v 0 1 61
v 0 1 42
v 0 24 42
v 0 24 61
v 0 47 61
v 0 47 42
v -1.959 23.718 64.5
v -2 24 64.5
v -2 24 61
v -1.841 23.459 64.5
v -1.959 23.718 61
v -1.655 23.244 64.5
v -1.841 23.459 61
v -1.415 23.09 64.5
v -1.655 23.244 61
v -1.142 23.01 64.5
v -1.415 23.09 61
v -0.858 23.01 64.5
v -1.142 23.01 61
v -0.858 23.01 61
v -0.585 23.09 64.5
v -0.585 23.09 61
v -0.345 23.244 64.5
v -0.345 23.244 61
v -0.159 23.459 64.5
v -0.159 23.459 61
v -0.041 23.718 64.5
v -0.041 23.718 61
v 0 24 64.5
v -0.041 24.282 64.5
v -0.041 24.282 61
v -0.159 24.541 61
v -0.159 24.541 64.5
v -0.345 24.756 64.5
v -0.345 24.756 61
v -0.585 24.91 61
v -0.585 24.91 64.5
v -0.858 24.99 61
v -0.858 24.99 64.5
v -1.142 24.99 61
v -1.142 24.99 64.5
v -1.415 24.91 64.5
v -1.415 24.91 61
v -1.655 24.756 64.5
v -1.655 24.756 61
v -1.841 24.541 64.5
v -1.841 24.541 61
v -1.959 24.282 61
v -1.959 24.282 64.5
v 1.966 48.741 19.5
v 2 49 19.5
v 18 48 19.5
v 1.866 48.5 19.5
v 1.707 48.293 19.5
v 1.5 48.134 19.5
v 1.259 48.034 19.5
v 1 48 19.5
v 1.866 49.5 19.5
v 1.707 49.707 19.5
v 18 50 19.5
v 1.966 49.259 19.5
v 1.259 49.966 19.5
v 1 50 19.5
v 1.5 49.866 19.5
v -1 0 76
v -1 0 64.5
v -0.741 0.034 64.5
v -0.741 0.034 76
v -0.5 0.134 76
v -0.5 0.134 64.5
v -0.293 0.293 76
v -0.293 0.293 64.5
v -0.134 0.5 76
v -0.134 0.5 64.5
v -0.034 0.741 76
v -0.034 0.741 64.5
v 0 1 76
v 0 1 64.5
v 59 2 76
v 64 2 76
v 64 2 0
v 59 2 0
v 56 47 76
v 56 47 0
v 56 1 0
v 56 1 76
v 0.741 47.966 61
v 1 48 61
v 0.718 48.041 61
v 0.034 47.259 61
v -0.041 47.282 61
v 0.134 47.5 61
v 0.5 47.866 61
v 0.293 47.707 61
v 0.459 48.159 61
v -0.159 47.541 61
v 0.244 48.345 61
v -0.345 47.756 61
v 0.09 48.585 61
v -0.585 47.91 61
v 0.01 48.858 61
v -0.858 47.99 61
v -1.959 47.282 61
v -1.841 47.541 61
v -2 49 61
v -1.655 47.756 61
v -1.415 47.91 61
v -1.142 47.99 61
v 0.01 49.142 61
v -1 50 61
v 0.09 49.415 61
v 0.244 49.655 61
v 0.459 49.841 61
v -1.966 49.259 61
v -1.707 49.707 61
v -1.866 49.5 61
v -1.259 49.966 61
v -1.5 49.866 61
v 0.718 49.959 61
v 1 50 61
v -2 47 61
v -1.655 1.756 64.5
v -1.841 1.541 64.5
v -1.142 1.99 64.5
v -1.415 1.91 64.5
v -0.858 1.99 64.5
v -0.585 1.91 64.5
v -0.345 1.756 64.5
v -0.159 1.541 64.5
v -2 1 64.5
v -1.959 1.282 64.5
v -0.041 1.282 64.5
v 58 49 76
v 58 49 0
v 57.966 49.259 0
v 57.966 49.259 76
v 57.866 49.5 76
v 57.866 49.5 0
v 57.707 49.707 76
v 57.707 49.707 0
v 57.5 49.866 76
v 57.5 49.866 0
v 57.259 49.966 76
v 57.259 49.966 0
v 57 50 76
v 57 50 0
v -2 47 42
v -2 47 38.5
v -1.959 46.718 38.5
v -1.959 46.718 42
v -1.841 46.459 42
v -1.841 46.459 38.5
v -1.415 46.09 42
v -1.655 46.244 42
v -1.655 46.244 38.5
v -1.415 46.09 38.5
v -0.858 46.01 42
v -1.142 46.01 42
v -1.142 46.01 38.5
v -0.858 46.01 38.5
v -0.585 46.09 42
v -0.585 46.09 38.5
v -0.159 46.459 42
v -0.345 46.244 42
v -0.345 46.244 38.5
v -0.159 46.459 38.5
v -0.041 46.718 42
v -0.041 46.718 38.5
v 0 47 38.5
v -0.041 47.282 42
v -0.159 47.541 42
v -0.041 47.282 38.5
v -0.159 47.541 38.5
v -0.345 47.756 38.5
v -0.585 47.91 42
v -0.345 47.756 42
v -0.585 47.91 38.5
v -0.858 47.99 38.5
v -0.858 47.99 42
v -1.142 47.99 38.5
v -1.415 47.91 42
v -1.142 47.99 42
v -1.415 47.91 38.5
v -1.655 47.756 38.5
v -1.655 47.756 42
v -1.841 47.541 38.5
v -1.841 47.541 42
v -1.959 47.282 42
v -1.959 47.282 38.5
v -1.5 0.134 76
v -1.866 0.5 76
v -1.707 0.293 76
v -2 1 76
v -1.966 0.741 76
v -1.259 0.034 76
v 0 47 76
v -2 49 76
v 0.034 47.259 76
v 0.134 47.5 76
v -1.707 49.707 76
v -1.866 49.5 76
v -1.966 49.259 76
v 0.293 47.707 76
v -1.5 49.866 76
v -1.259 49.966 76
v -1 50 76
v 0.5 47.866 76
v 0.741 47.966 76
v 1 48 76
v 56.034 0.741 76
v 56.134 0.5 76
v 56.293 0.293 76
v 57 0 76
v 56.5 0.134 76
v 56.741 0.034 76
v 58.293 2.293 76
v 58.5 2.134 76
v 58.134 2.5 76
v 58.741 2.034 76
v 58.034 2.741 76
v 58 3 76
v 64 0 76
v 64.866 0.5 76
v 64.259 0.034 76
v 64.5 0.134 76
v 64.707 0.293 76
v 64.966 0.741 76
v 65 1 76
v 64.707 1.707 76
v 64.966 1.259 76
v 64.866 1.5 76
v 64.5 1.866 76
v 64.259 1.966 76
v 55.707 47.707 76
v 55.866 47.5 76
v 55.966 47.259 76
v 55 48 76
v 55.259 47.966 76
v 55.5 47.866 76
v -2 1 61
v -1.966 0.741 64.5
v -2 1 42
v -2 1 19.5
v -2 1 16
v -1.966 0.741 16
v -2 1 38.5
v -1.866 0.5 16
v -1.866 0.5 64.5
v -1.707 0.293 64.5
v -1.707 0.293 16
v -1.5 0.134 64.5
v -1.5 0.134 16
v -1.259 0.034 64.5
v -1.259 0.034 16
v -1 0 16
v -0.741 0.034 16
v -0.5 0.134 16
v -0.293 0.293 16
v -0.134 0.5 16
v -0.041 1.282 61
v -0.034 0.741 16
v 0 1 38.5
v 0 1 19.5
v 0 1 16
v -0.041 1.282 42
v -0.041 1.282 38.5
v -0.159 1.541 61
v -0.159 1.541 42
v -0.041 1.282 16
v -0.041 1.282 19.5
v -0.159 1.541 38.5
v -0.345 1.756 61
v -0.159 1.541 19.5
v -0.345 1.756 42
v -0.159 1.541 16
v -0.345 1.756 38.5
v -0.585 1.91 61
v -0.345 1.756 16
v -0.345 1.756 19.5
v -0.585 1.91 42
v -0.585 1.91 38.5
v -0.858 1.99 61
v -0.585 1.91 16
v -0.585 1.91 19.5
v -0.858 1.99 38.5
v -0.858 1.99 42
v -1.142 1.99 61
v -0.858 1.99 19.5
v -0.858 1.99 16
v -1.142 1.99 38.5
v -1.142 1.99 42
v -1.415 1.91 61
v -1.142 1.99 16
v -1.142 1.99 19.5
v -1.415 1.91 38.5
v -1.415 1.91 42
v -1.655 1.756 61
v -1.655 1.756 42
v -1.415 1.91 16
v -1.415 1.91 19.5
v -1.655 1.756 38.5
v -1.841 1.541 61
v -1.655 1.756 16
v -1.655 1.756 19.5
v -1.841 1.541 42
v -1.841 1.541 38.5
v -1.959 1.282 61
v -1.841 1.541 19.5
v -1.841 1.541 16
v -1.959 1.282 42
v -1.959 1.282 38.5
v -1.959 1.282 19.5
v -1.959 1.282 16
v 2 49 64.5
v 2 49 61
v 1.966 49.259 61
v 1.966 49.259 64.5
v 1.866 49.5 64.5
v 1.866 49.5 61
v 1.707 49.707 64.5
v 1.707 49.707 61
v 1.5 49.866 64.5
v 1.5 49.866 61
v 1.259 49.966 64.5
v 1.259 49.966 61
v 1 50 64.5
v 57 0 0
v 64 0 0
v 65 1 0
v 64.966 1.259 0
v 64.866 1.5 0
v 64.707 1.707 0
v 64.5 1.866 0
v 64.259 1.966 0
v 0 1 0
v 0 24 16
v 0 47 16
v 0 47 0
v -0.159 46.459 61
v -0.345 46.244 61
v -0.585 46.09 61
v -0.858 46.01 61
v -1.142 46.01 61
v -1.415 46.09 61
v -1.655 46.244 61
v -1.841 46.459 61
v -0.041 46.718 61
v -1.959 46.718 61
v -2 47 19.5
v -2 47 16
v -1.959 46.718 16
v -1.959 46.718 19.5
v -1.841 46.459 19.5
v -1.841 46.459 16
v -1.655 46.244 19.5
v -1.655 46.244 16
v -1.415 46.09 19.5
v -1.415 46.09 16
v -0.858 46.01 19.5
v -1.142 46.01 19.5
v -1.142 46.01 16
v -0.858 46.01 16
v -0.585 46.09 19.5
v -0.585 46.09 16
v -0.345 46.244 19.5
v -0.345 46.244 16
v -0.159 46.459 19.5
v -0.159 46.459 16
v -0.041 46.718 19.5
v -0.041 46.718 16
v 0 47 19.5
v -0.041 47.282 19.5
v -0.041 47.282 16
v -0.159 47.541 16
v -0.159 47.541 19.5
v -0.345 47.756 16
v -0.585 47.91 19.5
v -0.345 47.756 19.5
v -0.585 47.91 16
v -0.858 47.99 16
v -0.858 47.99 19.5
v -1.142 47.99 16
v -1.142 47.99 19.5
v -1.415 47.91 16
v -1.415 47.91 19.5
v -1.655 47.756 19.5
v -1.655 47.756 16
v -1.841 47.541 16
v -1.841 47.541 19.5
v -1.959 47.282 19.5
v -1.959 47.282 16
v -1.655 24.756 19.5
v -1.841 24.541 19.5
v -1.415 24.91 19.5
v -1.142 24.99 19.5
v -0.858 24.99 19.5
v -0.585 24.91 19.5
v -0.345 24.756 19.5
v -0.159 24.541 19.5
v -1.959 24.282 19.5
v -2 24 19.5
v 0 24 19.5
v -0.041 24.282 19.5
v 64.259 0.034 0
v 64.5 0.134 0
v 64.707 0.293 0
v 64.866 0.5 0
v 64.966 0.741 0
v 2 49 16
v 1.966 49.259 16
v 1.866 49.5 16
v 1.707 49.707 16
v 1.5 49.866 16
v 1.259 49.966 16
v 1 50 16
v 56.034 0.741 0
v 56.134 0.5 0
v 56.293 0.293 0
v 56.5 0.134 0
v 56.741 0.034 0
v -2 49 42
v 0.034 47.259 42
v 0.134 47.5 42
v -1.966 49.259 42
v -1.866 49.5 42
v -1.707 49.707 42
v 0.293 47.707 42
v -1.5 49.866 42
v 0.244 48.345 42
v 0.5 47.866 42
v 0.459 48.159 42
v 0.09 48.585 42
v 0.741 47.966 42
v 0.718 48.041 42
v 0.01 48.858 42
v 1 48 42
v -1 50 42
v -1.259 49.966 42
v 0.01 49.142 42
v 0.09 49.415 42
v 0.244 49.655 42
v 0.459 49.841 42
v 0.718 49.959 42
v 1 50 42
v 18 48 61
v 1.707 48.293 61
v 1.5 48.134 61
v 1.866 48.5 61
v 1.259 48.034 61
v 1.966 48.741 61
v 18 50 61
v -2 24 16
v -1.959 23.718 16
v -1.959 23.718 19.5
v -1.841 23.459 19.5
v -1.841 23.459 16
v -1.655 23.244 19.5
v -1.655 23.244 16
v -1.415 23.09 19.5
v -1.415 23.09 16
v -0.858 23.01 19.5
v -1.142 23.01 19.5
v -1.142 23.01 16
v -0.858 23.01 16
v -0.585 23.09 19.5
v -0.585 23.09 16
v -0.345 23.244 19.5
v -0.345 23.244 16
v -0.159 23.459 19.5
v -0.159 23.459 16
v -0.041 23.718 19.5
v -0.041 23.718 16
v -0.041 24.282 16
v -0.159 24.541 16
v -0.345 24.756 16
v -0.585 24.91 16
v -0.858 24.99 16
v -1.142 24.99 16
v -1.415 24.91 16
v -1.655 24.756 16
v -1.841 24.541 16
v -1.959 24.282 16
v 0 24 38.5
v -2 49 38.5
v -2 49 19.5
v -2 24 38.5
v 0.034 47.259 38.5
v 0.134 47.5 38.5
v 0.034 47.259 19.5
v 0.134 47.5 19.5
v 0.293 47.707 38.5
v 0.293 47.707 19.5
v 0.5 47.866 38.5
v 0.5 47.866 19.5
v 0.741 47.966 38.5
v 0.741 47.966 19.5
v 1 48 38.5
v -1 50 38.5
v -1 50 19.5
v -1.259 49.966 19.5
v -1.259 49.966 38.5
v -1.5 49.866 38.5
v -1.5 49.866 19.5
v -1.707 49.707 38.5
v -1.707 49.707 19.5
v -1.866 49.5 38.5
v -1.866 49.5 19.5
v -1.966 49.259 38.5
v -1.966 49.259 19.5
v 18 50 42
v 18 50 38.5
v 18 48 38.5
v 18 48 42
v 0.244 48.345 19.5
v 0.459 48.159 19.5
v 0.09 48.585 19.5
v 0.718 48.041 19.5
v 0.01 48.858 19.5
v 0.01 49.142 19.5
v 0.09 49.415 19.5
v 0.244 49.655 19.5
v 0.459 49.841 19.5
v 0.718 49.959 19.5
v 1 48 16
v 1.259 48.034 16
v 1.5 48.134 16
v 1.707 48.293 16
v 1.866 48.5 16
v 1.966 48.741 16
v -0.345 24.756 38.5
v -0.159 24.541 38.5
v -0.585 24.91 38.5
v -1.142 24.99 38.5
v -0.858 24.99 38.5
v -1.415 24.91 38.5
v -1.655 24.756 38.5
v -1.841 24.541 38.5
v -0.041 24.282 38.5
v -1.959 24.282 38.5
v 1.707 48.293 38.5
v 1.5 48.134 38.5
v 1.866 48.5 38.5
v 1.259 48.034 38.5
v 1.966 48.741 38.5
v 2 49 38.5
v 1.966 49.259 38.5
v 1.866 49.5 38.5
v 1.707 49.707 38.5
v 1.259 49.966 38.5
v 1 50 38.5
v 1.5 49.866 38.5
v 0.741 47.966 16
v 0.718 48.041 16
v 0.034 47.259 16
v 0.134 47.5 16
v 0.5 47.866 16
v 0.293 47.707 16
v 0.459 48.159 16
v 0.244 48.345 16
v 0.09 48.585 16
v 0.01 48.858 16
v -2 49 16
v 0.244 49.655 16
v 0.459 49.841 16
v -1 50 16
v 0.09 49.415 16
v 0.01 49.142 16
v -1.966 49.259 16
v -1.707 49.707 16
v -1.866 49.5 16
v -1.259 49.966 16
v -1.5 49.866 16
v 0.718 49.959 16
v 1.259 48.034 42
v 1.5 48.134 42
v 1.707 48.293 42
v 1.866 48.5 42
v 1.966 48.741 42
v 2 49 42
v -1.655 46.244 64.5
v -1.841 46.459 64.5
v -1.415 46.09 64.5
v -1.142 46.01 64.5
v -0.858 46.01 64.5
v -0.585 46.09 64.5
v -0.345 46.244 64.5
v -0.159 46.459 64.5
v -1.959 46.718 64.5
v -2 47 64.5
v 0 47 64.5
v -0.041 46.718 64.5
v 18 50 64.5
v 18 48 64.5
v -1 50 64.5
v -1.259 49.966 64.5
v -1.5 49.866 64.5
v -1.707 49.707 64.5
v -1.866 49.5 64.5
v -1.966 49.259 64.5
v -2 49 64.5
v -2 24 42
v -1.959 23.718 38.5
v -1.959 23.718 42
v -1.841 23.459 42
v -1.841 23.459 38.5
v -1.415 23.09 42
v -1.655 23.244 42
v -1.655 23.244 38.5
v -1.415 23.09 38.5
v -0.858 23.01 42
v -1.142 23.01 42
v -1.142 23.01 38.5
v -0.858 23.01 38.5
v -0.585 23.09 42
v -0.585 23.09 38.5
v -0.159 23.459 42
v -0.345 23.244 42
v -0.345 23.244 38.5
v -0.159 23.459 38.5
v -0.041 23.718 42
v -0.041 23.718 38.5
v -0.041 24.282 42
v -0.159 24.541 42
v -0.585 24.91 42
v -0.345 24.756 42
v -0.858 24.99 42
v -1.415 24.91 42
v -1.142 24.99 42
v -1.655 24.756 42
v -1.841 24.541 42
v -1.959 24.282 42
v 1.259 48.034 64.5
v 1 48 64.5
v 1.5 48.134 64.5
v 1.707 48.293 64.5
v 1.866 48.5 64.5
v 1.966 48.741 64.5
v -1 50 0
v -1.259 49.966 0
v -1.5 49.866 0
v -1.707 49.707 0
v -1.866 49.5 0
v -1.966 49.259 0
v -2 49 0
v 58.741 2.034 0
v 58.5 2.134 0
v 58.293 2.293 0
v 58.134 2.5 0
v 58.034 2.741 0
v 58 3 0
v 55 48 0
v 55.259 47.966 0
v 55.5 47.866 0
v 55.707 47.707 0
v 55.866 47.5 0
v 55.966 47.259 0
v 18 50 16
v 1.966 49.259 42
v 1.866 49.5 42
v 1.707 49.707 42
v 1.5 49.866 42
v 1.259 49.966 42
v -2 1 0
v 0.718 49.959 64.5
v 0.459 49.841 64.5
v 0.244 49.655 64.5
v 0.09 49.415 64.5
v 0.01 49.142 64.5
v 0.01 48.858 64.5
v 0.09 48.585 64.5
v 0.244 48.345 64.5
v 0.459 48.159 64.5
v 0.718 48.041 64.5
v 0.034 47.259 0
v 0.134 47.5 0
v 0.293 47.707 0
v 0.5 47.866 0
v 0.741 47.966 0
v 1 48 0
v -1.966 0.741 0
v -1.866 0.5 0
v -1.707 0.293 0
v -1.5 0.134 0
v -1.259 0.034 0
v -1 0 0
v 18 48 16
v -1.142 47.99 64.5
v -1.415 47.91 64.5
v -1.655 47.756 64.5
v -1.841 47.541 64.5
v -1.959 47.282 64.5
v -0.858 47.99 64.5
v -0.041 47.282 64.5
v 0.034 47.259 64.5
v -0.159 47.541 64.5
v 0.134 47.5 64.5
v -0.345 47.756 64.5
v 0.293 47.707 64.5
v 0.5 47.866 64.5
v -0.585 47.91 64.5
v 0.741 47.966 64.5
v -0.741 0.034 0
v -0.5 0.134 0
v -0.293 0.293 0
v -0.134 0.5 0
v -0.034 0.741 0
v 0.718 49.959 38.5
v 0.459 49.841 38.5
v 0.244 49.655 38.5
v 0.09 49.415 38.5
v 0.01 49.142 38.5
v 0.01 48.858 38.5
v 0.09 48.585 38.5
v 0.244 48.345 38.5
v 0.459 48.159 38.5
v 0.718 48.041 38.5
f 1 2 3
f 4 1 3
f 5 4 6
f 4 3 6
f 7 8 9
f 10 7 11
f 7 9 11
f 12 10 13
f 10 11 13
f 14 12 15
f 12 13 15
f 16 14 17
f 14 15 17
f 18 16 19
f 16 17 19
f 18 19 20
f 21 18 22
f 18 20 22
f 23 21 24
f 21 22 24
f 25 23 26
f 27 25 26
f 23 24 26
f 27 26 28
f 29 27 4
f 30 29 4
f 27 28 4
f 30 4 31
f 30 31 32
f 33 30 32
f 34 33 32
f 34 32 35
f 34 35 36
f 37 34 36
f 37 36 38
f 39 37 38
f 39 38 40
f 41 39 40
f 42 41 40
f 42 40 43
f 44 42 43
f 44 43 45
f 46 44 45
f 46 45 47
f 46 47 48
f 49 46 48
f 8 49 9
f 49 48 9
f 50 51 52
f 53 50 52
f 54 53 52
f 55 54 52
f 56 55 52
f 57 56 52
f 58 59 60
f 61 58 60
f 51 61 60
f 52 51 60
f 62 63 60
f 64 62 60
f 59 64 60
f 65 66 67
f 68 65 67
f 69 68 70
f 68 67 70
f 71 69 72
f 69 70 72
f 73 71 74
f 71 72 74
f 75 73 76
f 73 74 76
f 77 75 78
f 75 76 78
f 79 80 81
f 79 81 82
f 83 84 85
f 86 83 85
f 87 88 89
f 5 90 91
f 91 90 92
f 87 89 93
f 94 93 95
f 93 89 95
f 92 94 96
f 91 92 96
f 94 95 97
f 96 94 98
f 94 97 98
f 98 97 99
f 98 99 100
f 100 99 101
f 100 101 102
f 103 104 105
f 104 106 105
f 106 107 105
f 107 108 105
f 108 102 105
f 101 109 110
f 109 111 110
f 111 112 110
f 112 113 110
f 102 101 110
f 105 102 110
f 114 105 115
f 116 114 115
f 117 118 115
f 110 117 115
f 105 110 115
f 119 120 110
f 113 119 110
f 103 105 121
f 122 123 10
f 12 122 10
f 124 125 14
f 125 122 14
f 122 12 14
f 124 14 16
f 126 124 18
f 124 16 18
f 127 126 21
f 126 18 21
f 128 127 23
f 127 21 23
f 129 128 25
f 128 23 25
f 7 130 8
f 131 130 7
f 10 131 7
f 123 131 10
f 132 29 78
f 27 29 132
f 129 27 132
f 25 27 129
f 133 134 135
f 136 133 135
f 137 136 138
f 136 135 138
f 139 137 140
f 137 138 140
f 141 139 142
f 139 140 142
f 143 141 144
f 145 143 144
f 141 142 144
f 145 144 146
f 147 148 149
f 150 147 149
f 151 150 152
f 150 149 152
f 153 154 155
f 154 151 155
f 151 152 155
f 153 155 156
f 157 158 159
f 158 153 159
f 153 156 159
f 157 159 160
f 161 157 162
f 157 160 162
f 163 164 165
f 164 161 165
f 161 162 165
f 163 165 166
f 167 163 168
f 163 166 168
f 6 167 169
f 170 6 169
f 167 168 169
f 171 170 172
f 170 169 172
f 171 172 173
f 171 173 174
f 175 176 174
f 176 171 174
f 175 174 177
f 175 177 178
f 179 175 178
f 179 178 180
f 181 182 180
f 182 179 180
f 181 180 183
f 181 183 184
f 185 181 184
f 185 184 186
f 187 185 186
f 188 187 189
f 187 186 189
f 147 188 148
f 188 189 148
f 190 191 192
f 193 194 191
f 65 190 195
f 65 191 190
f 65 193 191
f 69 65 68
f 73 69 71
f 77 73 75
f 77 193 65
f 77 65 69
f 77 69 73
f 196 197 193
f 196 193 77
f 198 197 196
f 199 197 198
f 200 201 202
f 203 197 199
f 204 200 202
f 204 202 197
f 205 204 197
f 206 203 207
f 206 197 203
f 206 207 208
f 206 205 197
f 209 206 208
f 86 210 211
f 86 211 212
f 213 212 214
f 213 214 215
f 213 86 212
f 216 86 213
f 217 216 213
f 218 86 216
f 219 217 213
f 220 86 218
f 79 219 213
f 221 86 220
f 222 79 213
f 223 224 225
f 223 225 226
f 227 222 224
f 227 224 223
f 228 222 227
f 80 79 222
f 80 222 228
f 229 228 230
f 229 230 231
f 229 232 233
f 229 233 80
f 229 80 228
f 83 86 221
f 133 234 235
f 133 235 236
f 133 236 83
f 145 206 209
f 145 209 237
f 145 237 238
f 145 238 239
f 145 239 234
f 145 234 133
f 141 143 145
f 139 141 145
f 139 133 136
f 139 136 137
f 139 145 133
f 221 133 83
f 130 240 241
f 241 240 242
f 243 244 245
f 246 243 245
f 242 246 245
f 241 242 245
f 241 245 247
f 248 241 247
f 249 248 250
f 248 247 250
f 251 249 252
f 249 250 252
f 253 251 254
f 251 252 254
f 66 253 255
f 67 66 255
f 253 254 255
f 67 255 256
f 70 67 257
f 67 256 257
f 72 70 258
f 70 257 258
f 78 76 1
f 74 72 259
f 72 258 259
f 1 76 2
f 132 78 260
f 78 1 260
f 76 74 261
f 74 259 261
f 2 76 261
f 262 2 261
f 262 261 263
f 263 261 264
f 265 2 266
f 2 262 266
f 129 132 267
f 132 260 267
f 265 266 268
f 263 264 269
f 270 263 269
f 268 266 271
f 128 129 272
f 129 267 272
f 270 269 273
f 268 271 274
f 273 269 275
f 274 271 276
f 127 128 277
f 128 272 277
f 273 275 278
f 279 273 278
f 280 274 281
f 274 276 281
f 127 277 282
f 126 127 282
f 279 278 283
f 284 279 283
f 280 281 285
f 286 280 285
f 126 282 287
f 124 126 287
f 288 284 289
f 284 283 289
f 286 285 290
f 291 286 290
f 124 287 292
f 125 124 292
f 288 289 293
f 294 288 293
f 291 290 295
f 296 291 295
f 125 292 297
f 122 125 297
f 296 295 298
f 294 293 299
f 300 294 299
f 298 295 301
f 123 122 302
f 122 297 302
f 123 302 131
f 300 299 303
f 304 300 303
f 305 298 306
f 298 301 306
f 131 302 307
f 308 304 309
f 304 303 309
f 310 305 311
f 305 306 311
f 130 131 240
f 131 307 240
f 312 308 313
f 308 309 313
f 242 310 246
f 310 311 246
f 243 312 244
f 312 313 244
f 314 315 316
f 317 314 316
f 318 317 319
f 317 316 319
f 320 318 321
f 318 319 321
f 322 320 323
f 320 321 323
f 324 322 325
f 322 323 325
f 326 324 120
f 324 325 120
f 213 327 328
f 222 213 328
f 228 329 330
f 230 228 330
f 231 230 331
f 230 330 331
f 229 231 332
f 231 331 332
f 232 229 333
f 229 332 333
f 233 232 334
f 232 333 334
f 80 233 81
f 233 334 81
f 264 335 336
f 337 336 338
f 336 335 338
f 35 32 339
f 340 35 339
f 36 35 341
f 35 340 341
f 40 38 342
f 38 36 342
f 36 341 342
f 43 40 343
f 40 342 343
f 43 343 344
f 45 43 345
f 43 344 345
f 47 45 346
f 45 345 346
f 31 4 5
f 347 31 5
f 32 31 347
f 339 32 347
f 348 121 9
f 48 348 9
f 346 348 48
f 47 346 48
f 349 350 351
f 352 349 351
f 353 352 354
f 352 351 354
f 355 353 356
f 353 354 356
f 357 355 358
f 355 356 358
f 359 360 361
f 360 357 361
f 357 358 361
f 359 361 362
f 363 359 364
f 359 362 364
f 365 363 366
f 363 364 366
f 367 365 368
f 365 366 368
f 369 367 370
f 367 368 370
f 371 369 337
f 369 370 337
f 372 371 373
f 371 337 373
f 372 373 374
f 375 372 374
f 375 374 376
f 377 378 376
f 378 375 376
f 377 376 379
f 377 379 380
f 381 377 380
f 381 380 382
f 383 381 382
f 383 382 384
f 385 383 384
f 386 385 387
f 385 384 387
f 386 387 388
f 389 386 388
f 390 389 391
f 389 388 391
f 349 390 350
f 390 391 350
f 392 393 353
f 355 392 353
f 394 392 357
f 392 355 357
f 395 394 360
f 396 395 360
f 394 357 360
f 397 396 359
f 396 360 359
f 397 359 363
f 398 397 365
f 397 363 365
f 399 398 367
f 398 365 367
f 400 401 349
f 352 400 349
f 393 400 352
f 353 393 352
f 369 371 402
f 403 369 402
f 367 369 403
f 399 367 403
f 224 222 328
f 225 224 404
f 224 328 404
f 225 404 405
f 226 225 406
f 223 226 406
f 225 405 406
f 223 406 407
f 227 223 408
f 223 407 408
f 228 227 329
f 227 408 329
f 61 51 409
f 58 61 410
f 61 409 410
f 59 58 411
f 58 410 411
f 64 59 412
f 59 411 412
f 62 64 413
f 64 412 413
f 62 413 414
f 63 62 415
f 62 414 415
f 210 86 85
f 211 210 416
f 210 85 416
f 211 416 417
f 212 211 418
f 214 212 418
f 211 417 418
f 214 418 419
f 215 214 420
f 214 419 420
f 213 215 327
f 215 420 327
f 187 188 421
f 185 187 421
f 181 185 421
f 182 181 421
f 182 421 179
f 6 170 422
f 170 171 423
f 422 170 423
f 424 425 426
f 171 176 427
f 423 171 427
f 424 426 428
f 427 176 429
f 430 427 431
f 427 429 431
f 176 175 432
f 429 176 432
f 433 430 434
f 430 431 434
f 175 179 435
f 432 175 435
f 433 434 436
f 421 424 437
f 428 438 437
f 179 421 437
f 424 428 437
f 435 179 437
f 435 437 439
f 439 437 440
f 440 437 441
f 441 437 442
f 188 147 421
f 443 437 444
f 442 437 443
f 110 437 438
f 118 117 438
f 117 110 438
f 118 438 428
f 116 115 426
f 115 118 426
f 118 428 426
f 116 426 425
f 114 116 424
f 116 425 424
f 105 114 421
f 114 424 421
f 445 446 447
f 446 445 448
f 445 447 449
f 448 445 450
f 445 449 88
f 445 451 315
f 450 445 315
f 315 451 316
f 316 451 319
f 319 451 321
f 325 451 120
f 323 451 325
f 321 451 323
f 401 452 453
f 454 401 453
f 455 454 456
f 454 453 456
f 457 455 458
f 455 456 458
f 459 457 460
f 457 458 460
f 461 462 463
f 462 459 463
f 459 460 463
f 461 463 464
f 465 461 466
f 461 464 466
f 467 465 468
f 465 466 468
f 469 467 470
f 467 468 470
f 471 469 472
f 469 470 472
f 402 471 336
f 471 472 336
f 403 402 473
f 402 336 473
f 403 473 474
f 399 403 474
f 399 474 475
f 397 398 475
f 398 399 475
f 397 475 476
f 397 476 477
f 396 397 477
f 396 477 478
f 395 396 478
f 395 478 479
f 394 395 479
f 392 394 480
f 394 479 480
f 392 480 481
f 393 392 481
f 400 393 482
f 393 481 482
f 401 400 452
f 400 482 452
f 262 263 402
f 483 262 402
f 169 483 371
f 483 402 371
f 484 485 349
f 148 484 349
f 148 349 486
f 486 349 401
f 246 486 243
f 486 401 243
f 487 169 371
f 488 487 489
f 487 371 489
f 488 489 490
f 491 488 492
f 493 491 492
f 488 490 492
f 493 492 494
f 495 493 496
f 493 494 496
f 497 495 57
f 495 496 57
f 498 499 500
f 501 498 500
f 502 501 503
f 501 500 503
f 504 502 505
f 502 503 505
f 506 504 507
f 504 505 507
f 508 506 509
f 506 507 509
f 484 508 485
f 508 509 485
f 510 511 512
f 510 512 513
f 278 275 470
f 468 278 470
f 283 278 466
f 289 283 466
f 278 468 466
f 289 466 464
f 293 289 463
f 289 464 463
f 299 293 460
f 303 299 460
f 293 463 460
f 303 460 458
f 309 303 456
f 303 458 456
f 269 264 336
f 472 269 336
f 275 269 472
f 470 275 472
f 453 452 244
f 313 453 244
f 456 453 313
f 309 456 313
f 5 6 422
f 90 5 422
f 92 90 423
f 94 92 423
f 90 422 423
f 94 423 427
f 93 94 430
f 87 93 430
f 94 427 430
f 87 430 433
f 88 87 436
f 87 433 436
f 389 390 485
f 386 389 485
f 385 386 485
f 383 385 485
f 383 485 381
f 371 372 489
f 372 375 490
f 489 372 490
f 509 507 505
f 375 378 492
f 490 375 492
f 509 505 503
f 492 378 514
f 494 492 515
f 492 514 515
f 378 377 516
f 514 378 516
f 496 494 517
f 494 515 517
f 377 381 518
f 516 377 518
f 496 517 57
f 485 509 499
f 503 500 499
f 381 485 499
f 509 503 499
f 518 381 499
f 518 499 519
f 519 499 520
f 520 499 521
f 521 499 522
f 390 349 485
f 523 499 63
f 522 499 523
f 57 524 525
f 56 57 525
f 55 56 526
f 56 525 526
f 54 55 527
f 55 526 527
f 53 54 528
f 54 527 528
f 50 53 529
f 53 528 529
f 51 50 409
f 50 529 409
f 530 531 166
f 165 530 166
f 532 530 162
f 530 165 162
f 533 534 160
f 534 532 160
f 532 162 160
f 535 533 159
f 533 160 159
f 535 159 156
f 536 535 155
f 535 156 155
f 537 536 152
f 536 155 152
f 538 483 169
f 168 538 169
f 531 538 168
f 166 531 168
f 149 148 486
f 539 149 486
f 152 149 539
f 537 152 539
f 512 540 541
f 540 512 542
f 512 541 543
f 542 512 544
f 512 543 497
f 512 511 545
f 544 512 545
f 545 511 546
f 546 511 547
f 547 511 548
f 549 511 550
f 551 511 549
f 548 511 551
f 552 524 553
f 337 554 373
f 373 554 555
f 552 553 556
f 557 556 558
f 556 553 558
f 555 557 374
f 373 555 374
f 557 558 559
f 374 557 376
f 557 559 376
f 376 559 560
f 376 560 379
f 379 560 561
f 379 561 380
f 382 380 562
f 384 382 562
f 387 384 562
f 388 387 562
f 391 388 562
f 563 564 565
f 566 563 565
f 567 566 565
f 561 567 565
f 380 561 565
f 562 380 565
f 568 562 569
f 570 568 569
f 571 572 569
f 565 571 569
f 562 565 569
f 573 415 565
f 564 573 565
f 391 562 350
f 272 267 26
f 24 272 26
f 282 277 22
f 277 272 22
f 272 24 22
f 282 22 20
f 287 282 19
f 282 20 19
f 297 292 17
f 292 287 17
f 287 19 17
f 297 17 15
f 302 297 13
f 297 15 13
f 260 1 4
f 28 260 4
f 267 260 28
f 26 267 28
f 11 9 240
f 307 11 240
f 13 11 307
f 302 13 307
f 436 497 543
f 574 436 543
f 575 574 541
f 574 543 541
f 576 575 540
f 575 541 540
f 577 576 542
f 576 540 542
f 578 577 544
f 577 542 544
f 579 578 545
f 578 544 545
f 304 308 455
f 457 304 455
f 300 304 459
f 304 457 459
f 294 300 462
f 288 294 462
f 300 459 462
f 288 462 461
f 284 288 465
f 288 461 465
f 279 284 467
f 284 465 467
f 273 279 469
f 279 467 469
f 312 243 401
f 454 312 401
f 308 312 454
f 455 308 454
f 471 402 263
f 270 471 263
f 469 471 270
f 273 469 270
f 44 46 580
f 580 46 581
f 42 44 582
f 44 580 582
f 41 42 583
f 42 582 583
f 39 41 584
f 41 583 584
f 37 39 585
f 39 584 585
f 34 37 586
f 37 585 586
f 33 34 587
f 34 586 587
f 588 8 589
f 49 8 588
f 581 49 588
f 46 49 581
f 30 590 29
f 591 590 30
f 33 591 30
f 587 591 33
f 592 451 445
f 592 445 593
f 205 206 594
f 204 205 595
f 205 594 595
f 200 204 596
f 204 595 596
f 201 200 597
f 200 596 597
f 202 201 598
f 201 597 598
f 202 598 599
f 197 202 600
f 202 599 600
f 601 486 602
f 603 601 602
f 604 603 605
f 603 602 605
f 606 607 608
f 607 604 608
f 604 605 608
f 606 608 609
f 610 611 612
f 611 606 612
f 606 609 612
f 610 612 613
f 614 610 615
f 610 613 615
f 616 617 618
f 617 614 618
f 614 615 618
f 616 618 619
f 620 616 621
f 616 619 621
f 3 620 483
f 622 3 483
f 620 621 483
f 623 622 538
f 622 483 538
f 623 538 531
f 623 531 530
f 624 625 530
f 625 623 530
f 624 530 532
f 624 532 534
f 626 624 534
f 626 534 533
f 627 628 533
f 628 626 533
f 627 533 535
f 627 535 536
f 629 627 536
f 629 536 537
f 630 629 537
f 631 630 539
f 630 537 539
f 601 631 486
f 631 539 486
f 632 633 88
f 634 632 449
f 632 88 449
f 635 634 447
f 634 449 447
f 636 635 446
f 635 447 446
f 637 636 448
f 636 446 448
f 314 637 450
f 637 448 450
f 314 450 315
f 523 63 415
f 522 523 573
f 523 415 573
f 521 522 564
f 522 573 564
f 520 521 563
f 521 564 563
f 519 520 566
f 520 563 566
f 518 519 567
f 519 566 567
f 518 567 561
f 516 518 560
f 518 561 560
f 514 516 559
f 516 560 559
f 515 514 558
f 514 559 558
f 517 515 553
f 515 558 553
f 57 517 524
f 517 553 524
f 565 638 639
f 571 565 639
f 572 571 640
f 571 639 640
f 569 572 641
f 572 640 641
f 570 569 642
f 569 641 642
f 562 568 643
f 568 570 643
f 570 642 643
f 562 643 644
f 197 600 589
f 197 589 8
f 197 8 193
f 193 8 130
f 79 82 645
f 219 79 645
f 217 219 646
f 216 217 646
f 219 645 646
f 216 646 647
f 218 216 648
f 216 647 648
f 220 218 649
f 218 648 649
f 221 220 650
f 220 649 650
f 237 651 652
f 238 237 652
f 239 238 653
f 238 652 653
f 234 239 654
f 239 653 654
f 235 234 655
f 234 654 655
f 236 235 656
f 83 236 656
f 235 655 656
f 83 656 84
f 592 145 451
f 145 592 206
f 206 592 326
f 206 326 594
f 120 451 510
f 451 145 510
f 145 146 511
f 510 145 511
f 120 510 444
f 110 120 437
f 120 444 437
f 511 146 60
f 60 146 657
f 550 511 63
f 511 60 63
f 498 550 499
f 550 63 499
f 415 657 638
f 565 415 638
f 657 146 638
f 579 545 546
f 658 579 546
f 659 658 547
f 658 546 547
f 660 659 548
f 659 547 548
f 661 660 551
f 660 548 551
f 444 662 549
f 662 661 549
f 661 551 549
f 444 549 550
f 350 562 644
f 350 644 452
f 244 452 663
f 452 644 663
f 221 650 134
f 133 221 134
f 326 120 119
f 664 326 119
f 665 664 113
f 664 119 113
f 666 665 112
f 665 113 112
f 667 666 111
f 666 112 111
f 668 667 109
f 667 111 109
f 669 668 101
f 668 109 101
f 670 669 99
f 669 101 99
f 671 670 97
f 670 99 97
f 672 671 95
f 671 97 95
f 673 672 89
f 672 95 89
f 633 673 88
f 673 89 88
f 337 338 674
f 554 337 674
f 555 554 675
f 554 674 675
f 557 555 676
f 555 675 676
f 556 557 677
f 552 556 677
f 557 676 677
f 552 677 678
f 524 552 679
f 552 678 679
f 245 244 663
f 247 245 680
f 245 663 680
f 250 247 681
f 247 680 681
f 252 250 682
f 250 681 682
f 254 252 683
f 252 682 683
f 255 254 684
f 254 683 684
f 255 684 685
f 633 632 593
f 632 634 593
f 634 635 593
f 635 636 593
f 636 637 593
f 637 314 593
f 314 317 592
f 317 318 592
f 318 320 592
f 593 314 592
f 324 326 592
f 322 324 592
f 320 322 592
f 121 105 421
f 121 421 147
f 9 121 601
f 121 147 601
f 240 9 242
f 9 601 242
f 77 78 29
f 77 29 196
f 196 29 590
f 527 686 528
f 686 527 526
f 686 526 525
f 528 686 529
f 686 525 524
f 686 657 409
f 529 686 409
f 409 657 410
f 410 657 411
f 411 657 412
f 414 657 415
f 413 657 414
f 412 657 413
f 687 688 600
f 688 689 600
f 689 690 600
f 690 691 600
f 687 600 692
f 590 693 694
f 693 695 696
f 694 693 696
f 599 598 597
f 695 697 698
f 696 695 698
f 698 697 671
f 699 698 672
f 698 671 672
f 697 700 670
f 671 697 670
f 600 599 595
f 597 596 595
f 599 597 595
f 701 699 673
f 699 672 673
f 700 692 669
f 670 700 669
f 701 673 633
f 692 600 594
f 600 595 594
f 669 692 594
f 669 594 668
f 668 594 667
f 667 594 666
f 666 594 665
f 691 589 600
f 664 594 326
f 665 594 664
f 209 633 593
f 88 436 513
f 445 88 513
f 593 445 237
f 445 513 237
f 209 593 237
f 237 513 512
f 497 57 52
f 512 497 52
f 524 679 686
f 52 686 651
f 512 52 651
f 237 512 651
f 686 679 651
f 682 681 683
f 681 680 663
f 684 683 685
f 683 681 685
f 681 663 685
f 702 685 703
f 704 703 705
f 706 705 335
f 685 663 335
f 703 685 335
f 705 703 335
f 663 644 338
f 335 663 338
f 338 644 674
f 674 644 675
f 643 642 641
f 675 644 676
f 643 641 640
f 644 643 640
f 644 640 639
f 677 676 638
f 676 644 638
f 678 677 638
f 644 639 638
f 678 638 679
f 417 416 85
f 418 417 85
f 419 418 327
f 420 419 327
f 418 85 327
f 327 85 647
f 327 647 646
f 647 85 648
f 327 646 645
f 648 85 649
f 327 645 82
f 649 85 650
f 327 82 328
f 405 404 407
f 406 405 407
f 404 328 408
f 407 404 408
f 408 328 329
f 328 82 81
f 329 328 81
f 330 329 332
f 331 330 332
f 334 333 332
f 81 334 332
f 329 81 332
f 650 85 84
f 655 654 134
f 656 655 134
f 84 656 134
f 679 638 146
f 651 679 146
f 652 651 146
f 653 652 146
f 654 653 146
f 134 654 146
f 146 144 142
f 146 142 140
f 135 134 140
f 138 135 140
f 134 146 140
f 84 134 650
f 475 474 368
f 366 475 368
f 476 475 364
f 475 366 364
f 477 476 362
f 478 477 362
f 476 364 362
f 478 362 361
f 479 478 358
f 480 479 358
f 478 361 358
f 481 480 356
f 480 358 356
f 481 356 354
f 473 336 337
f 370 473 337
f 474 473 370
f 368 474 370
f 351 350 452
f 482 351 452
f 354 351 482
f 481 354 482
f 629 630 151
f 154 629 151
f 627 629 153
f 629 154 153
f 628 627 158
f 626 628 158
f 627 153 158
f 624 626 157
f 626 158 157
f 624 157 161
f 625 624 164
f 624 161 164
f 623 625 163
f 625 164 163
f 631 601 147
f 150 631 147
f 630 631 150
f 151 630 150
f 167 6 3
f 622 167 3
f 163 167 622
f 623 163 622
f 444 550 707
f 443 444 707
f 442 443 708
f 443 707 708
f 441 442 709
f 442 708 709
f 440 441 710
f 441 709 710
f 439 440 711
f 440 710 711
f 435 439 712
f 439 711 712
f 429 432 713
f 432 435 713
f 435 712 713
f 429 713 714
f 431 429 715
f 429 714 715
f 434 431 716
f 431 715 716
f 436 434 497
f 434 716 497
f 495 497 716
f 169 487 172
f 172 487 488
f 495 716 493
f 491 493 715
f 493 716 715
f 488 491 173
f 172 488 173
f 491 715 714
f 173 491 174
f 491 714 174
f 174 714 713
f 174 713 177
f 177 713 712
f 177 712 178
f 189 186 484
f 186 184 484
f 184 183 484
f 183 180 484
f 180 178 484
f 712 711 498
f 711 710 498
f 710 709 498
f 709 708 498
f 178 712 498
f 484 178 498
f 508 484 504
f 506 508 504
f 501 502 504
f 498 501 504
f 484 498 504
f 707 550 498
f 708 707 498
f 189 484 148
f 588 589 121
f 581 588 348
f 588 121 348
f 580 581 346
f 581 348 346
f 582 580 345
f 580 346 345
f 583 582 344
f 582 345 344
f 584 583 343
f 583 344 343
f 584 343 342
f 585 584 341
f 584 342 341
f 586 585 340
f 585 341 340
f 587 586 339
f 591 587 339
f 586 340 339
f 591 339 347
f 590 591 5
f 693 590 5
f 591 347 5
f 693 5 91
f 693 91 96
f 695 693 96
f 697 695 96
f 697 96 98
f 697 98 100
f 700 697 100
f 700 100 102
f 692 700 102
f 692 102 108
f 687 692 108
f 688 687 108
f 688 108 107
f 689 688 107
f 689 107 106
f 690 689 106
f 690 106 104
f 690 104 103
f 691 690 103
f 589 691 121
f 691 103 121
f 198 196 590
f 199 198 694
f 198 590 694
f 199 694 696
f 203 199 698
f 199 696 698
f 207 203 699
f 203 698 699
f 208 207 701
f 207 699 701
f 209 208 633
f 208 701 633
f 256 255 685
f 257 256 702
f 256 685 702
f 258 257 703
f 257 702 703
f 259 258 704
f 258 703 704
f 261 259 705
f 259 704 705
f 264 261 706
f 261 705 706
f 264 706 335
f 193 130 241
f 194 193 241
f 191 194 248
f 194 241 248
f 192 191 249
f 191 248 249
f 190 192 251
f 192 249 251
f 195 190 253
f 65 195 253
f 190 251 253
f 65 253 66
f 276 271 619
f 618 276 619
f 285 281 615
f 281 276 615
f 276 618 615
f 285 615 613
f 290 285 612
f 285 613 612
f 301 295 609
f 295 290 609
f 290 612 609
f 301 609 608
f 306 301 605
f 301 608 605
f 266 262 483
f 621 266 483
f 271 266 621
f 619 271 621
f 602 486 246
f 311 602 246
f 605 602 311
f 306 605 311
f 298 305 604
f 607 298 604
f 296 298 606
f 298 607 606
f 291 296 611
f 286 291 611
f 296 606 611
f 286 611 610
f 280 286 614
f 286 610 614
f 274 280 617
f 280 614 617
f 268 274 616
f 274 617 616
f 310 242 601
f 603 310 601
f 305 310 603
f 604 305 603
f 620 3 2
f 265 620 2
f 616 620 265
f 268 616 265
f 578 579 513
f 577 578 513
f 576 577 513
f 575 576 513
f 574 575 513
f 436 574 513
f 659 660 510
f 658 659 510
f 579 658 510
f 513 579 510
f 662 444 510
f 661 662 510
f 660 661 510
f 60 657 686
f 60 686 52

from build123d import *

# Parameters (mm, degrees)
F1_DEPTH = 76
F2_W     = 1
F2_H     = 3.5
F2_W_2   = 19
F3_DEPTH = 50.001
F5_DEPTH = 48.5


# Not quite as in the source:
# - a feature names something its author has since deleted; it is built from what else it names


with BuildPart() as f1:
    # F0 (on Top) → F1 (new body)
    with BuildSketch(Plane.XY):
        with BuildLine():
            ThreePointArc((-1, 0), (-0.2928932188, 0.2928932188), (0, 1))
            Line((0, 1), (0, 47))
            ThreePointArc((0, 47), (0.2928932188, 47.7071067812), (1, 48))
            Line((1, 48), (55, 48))
            ThreePointArc((55, 48), (55.7071067812, 47.7071067812), (56, 47))
            Line((56, 47), (56, 1))
            ThreePointArc((56, 1), (56.2928932188, 0.2928932188), (57, 0))
            Line((57, 0), (64, 0))
            ThreePointArc((64, 0), (64.7071067812, 0.2928932188), (65, 1))
            ThreePointArc((65, 1), (64.7071067812, 1.7071067812), (64, 2))
            Line((64, 2), (59, 2))
            ThreePointArc((59, 2), (58.2928932188, 2.2928932188), (58, 3))
            Line((58, 3), (58, 49))
            ThreePointArc((58, 49), (57.7071067812, 49.7071067812), (57, 50))
            Line((57, 50), (-1, 50))
            ThreePointArc((-1, 50), (-1.7071067812, 49.7071067812), (-2, 49))
            Line((-2, 49), (-2, 1))
            ThreePointArc((-2, 1), (-1.7071067812, 0.2928932188), (-1, 0))
        make_face()
    extrude(amount=F1_DEPTH)

    # F2 (on face) → F3 (cut, through all)
    with BuildSketch(Plane(origin=(0, 50, 0), x_dir=(-1, 0, 0), z_dir=(0, 1, 0))):
        with Locations((1.5, 17.75)):
            Rectangle(F2_W, F2_H)
        with Locations((-8.5, 17.75)):
            Rectangle(F2_W_2, F2_H)
        with Locations((-8.5, 40.25)):
            Rectangle(F2_W_2, F2_H)
        with Locations((-8.5, 62.75)):
            Rectangle(F2_W_2, F2_H)
        with Locations((1.5, 40.25)):
            Rectangle(F2_W, F2_H)
        with Locations((1.5, 62.75)):
            Rectangle(F2_W, F2_H)
    extrude(amount=-F3_DEPTH, mode=Mode.SUBTRACT)

    # F4 (on face) → F5 (join, through all)
    with BuildSketch(Plane.XY.offset(16)):
        with BuildLine():
            ThreePointArc((0, 47), (-1, 48), (-2, 47))
            ThreePointArc((-2, 47), (-1, 46), (0, 47))
        make_face()
        with BuildLine():
            ThreePointArc((0, 24), (-1, 25), (-2, 24))
            ThreePointArc((-2, 24), (-1, 23), (0, 24))
        make_face()
        with BuildLine():
            ThreePointArc((0, 1), (-1, 2), (-2, 1))
            ThreePointArc((-2, 1), (-1, 0), (0, 1))
        make_face()
        with BuildLine():
            ThreePointArc((0.999999997, 50), (0, 48.9999999985), (1, 48))
            ThreePointArc((1, 48), (1.7071067812, 48.2928932188), (2, 49))
            ThreePointArc((2, 49), (1.7071067801, 49.7071067822), (0.999999997, 50))
        make_face()
    extrude(amount=F5_DEPTH)


solid = f1.part
